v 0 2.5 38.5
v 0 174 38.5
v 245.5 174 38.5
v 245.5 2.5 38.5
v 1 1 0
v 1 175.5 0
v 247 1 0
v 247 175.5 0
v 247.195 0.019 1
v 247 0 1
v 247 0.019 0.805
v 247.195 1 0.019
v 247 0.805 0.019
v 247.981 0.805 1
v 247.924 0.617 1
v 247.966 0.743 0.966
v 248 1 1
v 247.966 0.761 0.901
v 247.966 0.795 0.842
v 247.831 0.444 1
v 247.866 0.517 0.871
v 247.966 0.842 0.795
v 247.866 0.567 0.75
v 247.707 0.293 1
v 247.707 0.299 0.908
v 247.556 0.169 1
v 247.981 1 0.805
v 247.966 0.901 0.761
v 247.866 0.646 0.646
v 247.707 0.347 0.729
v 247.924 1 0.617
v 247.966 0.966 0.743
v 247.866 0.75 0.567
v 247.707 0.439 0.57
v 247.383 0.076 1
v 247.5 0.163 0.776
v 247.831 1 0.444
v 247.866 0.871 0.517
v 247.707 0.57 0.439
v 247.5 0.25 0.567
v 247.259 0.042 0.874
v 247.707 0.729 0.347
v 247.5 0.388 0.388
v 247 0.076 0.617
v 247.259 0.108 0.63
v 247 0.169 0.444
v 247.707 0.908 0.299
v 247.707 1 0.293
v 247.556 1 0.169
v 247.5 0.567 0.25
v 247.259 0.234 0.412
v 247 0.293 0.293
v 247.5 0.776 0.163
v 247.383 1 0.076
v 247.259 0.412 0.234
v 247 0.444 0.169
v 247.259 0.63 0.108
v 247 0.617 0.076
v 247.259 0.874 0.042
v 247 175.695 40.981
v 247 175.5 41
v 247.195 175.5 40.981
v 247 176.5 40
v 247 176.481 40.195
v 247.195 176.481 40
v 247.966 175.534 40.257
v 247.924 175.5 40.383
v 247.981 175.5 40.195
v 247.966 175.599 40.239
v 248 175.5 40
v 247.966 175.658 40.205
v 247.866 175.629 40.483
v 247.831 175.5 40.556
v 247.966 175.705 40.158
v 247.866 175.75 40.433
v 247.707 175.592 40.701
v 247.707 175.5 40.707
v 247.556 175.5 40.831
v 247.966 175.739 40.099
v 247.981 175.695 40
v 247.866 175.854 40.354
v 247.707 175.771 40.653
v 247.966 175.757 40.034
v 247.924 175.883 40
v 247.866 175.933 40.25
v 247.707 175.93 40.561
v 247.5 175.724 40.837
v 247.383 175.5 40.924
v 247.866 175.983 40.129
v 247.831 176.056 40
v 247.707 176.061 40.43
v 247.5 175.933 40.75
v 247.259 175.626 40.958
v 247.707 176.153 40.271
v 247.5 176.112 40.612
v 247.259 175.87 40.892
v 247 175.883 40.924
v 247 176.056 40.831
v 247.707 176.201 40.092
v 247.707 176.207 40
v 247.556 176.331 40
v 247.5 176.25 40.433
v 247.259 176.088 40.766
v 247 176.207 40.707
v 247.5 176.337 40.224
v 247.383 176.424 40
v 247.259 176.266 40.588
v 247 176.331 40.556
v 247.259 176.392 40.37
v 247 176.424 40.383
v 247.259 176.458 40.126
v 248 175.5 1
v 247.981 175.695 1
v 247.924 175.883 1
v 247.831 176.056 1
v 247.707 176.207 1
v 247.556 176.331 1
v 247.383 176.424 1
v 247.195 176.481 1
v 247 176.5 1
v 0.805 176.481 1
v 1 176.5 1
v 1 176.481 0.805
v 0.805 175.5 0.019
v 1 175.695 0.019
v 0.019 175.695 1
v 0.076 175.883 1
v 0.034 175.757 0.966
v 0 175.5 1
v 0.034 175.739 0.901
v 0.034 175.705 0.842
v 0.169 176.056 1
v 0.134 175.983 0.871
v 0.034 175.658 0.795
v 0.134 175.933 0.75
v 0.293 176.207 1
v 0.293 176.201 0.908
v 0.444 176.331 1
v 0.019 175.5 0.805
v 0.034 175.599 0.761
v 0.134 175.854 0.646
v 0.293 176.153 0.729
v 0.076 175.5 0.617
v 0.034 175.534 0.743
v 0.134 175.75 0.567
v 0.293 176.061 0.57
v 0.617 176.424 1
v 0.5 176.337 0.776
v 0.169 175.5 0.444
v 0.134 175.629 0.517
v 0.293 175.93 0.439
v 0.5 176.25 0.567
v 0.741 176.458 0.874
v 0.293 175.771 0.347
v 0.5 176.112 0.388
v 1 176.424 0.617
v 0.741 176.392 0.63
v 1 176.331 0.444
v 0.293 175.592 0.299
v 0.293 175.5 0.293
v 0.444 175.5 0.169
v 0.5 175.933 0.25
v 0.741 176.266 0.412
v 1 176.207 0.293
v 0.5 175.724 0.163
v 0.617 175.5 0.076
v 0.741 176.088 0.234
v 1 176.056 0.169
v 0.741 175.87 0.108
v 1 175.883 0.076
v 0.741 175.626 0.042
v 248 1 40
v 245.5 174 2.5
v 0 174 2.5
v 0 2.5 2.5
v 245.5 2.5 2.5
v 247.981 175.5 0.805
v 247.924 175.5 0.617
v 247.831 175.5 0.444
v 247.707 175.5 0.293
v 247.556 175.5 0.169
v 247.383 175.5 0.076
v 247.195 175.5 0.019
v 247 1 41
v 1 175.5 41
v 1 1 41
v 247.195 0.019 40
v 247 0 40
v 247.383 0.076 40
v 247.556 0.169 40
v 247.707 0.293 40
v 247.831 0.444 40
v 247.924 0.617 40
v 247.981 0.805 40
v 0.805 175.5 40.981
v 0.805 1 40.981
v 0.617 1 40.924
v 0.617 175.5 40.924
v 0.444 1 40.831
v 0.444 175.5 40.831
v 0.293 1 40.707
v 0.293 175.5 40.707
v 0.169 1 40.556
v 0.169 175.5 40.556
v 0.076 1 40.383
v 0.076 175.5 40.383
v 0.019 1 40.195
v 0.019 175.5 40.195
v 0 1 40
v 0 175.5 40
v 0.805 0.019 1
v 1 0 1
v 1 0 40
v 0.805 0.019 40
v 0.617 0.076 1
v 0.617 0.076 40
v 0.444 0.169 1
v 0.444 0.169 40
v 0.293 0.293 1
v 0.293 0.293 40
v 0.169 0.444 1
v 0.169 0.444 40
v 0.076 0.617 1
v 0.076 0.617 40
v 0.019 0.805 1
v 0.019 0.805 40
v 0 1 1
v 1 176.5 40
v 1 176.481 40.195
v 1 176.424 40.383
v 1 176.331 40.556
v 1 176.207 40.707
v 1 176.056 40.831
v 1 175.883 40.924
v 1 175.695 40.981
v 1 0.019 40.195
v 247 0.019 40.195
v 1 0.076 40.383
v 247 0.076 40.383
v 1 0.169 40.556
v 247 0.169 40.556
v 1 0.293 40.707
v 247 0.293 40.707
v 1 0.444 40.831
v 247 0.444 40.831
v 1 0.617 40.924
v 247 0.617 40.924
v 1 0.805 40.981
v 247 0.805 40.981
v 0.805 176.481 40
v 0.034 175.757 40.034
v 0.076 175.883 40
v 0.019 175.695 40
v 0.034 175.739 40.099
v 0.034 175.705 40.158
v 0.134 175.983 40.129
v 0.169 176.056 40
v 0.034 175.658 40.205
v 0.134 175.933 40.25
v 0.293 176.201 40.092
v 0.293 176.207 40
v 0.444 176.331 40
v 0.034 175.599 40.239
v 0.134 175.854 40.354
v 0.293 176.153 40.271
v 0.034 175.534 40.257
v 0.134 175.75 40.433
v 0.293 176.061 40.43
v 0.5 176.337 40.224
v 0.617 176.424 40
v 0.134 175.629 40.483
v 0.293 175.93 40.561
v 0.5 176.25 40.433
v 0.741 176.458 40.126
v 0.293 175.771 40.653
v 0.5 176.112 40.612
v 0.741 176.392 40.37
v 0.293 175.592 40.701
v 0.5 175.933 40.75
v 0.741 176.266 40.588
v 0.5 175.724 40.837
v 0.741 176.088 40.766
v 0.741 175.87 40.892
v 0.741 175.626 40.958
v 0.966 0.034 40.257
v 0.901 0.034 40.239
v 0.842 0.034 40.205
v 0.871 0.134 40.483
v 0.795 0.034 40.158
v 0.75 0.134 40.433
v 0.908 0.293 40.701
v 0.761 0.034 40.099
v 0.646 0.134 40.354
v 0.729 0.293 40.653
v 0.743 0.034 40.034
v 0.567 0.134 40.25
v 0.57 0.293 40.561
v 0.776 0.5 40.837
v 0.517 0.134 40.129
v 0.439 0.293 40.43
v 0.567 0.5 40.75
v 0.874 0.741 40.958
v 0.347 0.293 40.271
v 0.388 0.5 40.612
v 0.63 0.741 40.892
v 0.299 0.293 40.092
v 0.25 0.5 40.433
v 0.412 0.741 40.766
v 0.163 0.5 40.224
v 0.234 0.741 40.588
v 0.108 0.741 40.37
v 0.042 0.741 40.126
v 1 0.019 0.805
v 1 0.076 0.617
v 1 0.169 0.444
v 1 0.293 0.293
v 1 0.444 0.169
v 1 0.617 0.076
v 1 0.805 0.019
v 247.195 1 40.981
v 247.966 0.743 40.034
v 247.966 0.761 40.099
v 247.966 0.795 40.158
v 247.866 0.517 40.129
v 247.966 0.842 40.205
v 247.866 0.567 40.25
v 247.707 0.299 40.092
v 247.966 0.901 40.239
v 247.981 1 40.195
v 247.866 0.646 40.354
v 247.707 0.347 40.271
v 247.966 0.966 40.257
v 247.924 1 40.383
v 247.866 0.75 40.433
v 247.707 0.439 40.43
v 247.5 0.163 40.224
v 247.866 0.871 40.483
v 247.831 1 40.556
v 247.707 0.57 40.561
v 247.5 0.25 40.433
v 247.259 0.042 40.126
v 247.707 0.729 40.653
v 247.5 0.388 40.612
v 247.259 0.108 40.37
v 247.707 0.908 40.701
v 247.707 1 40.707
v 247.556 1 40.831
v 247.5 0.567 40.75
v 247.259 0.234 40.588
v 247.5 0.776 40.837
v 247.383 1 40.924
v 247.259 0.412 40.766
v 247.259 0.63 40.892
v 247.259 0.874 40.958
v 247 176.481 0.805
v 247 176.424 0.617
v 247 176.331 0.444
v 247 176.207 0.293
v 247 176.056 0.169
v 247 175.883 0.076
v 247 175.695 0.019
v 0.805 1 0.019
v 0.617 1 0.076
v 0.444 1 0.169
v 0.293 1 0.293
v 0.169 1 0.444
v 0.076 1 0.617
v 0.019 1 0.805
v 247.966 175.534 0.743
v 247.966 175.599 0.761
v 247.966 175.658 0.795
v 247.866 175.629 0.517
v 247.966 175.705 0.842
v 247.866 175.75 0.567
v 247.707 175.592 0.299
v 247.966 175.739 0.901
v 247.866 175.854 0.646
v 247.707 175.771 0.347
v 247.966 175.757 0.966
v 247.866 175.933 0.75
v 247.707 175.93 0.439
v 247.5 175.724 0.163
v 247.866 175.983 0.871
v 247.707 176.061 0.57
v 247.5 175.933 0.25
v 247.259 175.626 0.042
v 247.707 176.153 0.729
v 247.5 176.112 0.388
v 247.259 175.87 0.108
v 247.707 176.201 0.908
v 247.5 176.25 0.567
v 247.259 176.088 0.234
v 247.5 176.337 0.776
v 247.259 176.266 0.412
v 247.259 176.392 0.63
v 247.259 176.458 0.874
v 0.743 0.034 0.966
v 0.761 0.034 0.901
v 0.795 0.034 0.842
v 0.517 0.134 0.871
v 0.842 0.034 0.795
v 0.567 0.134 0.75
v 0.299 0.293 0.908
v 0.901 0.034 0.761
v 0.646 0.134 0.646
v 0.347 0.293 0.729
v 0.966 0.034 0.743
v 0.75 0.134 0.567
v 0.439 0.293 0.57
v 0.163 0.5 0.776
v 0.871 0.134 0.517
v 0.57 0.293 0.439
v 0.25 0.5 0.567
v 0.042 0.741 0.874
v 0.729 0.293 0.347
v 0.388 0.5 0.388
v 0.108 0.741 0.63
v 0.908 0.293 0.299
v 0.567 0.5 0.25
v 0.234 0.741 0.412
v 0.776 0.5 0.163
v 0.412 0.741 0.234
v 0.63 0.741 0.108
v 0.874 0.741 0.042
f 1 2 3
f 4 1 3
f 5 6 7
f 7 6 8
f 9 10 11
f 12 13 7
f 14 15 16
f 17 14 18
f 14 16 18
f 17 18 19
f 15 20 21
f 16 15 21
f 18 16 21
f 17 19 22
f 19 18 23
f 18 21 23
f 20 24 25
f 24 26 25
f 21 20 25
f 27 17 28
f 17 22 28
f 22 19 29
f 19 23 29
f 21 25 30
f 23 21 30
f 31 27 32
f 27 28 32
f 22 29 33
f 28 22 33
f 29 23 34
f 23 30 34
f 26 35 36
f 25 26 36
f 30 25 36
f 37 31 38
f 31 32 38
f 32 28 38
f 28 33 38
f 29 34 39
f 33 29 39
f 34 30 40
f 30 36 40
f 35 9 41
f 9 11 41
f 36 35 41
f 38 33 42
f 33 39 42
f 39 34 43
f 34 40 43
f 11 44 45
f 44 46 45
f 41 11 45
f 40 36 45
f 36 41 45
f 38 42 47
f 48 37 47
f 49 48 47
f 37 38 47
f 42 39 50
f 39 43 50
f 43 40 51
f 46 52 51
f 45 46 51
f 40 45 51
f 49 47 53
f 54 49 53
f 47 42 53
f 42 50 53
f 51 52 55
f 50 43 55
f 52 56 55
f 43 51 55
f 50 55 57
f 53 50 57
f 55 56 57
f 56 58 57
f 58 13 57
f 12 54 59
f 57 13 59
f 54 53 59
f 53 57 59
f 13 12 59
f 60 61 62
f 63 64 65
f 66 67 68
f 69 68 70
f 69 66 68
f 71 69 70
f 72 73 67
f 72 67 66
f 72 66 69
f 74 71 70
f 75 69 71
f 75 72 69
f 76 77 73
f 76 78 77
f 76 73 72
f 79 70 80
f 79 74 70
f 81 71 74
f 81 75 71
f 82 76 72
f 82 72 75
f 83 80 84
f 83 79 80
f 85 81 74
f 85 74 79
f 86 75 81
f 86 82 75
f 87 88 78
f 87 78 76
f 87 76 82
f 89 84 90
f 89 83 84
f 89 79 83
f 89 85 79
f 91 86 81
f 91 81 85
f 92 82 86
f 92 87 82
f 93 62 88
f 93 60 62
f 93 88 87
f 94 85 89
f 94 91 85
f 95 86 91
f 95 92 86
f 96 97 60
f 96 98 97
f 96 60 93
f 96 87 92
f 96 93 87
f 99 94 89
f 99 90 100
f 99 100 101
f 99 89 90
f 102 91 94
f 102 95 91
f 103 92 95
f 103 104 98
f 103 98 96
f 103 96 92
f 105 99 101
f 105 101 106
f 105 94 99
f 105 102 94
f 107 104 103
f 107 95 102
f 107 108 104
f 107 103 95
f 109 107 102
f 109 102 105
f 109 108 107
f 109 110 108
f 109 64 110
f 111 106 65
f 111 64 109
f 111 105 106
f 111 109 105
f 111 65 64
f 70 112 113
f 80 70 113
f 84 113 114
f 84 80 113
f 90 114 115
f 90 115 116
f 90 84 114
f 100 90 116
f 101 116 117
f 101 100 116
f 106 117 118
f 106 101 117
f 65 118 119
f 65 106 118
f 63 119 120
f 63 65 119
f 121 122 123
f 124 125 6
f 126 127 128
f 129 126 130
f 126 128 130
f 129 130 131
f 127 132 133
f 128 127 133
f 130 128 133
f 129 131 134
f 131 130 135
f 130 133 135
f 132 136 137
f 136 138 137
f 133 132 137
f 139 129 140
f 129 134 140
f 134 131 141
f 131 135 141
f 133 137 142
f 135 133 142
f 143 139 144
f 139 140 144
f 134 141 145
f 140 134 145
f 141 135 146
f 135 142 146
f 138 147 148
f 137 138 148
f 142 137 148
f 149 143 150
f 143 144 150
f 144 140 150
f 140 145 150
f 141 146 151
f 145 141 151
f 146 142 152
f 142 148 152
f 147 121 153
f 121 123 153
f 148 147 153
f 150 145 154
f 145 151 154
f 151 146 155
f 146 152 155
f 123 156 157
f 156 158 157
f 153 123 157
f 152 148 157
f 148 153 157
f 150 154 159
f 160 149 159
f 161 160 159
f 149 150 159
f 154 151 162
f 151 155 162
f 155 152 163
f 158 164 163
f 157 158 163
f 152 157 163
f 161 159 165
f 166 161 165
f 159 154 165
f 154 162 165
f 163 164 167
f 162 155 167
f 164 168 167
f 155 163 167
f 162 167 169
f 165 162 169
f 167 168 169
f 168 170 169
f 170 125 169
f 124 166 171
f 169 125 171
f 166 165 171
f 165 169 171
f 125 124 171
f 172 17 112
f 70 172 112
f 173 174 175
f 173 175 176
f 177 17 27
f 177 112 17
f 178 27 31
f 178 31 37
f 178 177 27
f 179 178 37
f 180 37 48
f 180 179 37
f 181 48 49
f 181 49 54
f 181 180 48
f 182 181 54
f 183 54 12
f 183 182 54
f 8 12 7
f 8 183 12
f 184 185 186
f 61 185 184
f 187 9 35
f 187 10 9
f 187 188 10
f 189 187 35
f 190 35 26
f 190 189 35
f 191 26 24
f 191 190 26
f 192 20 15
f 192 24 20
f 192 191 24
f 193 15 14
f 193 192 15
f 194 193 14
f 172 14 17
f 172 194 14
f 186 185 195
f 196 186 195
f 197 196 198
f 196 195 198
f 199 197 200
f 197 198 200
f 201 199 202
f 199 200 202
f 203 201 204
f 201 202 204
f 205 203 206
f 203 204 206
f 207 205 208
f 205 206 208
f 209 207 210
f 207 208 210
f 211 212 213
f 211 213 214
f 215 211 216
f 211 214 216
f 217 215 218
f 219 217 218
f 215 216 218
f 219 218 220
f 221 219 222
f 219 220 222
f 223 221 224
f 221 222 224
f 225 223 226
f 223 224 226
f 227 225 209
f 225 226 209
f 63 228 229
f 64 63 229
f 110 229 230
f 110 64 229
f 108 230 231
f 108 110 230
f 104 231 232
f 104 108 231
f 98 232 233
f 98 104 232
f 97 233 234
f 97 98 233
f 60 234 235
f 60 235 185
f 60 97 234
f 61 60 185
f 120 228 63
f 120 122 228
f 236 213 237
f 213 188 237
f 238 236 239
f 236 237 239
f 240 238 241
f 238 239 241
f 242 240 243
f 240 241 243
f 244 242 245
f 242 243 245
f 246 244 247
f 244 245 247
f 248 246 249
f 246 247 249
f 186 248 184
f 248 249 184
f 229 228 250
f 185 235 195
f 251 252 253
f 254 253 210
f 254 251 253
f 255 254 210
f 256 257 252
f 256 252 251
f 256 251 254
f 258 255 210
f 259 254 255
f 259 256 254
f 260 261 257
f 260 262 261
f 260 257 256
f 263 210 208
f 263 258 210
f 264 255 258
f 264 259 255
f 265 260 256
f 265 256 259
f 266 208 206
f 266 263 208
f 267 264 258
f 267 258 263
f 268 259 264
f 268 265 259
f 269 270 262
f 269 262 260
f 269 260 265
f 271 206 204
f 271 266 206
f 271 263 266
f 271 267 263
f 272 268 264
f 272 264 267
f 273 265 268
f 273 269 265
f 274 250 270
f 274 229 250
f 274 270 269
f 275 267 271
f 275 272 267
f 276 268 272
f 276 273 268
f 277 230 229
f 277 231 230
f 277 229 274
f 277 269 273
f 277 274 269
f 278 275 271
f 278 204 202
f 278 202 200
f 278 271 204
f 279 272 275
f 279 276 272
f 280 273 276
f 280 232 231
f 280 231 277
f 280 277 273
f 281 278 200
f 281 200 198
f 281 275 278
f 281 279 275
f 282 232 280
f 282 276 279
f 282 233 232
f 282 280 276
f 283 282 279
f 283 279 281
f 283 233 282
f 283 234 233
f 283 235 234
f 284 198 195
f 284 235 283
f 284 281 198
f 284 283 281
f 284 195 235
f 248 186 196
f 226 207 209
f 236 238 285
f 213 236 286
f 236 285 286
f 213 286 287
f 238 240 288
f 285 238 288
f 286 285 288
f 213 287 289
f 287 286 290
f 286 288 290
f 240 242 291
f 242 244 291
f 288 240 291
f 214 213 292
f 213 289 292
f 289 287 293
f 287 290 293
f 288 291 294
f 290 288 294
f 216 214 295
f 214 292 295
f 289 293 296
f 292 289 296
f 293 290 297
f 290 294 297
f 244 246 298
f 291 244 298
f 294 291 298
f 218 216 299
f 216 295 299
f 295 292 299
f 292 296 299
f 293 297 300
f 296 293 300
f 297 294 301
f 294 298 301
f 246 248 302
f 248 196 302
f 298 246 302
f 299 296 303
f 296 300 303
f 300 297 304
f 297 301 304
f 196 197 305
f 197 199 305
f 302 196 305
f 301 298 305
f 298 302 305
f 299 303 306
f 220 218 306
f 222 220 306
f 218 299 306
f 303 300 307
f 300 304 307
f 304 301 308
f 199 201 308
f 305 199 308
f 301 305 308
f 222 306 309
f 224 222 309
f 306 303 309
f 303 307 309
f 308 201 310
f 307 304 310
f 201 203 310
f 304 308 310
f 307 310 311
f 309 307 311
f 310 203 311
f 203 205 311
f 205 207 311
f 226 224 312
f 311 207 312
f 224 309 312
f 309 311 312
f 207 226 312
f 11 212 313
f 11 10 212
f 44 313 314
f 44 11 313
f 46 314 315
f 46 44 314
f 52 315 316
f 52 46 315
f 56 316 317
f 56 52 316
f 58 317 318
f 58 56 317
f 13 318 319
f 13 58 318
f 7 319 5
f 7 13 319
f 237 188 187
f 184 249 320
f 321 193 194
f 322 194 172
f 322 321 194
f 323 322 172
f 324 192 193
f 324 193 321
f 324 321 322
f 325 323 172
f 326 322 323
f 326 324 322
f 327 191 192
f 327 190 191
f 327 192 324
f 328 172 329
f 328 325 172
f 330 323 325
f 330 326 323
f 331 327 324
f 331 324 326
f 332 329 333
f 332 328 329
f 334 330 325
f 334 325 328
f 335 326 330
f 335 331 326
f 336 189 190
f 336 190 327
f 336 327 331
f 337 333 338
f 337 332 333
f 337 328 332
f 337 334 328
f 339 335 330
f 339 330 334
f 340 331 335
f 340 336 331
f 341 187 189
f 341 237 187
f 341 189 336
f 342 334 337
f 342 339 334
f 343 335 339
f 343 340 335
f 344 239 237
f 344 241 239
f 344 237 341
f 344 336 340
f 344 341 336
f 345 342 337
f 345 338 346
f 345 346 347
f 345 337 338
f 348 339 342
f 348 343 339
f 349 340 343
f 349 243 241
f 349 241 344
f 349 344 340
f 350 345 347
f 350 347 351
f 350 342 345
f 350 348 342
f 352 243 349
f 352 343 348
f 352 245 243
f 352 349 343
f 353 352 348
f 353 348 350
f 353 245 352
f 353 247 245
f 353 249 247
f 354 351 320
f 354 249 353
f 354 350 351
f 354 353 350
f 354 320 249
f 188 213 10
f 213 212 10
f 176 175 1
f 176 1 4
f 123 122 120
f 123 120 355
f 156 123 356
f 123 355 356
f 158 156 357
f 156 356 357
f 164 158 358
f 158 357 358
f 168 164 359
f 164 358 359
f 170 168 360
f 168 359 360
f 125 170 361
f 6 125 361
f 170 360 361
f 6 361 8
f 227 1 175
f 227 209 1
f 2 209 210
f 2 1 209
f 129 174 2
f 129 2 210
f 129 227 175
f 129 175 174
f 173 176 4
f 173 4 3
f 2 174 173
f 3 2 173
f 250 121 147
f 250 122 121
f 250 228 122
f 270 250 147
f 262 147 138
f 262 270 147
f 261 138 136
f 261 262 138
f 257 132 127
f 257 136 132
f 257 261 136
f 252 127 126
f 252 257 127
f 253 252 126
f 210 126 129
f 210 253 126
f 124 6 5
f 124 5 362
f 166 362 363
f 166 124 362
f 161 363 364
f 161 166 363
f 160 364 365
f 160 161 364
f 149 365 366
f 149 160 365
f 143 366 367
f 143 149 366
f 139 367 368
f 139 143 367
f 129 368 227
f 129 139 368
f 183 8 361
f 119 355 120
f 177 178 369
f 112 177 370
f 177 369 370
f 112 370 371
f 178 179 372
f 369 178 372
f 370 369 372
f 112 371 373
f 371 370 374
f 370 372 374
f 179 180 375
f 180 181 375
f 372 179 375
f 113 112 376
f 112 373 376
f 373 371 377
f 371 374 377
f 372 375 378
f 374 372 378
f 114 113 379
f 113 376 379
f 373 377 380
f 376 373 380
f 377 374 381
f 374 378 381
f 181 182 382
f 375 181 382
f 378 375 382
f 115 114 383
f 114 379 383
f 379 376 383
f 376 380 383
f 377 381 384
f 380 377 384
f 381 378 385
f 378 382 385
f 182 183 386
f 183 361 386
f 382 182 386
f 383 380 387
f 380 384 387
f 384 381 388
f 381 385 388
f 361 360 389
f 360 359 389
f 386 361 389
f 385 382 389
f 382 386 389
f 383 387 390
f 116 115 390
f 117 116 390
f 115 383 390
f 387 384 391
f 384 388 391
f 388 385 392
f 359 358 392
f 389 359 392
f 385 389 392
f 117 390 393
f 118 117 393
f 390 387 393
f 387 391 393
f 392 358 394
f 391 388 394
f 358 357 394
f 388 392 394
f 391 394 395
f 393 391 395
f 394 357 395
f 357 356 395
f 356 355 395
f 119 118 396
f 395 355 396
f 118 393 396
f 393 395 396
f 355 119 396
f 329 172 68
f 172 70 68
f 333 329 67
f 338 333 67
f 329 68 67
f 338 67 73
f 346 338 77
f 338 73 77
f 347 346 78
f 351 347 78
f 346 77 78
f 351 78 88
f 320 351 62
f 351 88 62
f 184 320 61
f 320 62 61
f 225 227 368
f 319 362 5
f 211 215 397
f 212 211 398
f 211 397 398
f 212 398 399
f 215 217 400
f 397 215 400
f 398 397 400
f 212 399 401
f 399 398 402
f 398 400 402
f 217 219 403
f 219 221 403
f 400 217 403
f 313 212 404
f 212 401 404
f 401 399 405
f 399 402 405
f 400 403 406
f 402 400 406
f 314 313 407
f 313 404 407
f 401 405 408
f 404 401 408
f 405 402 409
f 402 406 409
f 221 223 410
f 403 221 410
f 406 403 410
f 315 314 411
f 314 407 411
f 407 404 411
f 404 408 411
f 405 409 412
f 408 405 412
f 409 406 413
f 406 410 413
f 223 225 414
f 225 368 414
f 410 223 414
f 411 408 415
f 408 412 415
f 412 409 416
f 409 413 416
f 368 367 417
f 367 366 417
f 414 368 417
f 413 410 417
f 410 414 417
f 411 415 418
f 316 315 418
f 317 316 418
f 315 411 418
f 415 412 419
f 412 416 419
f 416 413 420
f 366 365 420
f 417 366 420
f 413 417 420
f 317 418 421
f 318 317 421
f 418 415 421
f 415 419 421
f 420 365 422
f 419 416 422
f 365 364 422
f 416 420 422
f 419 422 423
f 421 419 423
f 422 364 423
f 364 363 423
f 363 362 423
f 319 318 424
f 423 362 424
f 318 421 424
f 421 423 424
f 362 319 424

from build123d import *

# Parameters (mm, degrees)
F0_W     = 248
F0_H     = 176.5
F1_DEPTH = 41
F3_T     = -2.5
F4_R     = 1


with BuildPart() as f1:
    # F0 (on Top) → F1 (new body)
    with BuildSketch(Plane.XY):
        with Locations((124, 88.25)):
            Rectangle(F0_W, F0_H)
    extrude(amount=F1_DEPTH)

    # F3
    f3_openings = [f1.faces().sort_by_distance(p)[0] for p in [
        (0, 88.25, 20.5),
    ]]
    offset(amount=F3_T, openings=f3_openings)

    # F4
    f4_edges = [f1.edges().sort_by_distance(p)[0] for p in [
        (124, 176.5, 41),
        (124, 176.5, 0),
        (0, 176.5, 20.5),
        (0, 88.25, 0),
        (0, 88.25, 41),
        (124, 0, 41),
        (0, 0, 20.5),
        (124, 0, 0),
        (248, 0, 20.5),
        (248, 88.25, 41),
        (248, 88.25, 0),
        (248, 176.5, 20.5),
    ]]
    fillet(f4_edges, radius=F4_R)


solid = f1.part
